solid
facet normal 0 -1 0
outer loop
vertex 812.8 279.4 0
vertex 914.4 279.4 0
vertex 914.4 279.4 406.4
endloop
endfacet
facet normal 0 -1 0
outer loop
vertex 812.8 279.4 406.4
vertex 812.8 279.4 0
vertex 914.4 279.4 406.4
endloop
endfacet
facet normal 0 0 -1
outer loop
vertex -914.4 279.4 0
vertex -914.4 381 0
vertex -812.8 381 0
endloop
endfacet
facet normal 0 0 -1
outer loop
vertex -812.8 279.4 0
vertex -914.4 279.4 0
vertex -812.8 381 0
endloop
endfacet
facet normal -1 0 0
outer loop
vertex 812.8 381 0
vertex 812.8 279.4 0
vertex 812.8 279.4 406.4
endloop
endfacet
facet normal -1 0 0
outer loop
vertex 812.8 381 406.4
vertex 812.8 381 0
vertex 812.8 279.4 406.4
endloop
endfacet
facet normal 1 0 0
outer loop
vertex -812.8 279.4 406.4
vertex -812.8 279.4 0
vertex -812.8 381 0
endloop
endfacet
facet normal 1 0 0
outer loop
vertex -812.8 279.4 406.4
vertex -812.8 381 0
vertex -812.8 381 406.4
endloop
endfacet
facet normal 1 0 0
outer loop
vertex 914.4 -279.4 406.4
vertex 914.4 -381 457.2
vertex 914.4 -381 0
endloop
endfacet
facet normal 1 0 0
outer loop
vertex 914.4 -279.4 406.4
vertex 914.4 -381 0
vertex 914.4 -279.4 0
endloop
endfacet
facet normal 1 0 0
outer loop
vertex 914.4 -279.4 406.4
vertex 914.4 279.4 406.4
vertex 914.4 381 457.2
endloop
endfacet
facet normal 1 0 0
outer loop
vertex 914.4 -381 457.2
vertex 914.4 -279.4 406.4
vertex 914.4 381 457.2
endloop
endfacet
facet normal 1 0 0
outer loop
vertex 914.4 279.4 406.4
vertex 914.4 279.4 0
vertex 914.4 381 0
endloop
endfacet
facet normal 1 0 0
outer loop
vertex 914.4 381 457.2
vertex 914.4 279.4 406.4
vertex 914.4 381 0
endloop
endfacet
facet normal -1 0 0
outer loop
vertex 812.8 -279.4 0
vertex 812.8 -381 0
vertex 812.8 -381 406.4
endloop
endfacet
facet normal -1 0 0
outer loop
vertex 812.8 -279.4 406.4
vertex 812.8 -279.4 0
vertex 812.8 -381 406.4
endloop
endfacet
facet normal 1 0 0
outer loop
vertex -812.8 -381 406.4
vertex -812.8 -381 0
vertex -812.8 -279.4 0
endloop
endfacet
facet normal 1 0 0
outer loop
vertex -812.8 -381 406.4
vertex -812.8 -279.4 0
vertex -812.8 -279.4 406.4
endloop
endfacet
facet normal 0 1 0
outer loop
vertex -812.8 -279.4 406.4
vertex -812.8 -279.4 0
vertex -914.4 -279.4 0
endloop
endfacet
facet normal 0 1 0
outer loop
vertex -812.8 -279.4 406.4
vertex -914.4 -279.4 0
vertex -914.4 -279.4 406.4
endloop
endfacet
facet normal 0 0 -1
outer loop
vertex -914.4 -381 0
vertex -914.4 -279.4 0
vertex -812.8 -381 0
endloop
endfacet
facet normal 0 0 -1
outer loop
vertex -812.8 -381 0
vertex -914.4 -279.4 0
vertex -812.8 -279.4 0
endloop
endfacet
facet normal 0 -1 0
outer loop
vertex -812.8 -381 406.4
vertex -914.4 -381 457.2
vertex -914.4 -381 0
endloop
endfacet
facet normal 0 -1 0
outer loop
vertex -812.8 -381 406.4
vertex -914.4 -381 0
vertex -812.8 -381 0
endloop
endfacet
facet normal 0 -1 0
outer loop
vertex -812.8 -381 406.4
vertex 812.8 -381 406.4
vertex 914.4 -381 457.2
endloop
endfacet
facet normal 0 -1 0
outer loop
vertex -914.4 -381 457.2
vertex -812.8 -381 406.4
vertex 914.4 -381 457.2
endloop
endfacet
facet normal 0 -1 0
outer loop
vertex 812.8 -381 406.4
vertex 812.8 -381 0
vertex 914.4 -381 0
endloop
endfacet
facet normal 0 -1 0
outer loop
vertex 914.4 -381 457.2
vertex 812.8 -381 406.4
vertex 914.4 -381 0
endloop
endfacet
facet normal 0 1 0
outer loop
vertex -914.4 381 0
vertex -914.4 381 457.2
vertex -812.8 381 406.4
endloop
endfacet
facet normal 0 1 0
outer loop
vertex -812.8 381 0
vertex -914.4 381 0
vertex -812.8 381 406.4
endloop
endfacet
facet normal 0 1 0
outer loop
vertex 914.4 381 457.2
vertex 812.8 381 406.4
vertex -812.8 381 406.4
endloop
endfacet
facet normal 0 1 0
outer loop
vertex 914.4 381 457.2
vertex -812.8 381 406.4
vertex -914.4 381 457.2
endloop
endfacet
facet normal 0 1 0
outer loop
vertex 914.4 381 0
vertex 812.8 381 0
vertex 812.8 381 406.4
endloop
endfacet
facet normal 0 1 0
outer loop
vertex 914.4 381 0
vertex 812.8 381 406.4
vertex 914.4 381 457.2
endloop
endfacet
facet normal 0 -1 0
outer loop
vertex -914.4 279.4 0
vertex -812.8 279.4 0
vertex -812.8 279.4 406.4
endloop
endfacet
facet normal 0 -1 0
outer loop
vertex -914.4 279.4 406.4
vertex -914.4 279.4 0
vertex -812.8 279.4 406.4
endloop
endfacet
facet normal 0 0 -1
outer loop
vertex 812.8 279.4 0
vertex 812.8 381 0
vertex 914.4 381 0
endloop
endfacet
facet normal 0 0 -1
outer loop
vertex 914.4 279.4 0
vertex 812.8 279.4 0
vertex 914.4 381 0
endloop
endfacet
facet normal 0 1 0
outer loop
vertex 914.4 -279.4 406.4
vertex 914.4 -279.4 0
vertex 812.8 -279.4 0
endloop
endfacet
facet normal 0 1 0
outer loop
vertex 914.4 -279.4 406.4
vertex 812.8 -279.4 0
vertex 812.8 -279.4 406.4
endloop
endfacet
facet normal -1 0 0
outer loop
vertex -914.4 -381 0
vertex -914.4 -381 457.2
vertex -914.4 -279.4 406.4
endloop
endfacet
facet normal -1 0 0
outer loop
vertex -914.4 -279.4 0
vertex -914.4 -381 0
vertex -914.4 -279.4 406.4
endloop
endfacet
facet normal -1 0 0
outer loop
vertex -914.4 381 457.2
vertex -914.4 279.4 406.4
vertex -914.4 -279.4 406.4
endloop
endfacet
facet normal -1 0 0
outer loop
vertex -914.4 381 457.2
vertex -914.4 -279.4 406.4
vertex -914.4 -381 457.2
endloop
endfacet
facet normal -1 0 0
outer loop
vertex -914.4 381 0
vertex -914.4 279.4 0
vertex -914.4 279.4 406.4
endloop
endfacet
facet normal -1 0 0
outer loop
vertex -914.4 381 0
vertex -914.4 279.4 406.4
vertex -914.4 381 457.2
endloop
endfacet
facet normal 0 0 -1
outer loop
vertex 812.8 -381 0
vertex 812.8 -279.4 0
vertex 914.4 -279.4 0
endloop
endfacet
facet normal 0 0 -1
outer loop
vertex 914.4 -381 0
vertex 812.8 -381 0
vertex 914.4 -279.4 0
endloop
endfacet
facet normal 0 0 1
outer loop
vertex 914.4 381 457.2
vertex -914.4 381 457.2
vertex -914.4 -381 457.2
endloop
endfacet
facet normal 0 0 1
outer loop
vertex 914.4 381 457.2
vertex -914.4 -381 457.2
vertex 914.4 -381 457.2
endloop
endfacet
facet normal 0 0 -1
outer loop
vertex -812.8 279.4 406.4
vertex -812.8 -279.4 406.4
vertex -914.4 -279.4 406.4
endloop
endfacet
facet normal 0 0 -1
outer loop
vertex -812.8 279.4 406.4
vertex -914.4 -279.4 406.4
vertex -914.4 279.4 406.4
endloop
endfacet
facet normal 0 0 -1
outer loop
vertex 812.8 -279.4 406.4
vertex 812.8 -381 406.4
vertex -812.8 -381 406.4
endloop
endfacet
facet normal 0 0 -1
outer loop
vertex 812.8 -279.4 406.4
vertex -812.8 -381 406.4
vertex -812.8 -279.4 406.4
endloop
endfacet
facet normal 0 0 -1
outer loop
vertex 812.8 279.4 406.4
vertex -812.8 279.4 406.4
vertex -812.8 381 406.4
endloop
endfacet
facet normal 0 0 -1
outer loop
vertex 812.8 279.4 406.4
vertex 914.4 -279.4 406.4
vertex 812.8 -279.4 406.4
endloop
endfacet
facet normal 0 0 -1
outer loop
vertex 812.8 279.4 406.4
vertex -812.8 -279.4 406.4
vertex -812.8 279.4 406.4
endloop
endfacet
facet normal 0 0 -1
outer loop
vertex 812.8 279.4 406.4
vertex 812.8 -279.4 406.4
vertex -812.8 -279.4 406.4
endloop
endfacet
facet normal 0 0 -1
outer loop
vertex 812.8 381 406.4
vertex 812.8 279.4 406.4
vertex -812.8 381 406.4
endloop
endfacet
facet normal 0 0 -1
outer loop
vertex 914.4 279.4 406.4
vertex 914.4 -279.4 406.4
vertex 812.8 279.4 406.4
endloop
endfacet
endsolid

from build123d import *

# Parameters (mm, degrees)
F0_W     = 1828.8
F0_H     = 762
F1_DEPTH = 406.4
F3_DEPTH = 50.8
F2_W     = 1625.6
F2_H     = 406.4
F4_DEPTH = 762
F5_W     = 558.8
F5_H     = 406.4
F6_DEPTH = 1828.8


with BuildPart() as f1:
    # F0 (on Top) → F1 (new body)
    with BuildSketch(Plane.XY):
        Rectangle(F0_W, F0_H)
    extrude(amount=F1_DEPTH)

    # F3 (add): a face of the model
    f3_faces = [f1.faces().sort_by_distance(p)[0] for p in [
        (0, 0, 406.4),
    ]]
    extrude(f3_faces, amount=F3_DEPTH)

    # F2 (on face) → F4 (cut)
    with BuildSketch(Plane.XZ.offset(381)):
        with Locations((0, 203.2)):
            Rectangle(F2_W, F2_H)
    extrude(amount=-F4_DEPTH, mode=Mode.SUBTRACT)

    # F5 (on face) → F6 (cut)
    with BuildSketch(Plane.YZ.offset(914.4)):
        with Locations((0, 203.2)):
            Rectangle(F5_W, F5_H)
    extrude(amount=-F6_DEPTH, mode=Mode.SUBTRACT)


solid = f1.part
